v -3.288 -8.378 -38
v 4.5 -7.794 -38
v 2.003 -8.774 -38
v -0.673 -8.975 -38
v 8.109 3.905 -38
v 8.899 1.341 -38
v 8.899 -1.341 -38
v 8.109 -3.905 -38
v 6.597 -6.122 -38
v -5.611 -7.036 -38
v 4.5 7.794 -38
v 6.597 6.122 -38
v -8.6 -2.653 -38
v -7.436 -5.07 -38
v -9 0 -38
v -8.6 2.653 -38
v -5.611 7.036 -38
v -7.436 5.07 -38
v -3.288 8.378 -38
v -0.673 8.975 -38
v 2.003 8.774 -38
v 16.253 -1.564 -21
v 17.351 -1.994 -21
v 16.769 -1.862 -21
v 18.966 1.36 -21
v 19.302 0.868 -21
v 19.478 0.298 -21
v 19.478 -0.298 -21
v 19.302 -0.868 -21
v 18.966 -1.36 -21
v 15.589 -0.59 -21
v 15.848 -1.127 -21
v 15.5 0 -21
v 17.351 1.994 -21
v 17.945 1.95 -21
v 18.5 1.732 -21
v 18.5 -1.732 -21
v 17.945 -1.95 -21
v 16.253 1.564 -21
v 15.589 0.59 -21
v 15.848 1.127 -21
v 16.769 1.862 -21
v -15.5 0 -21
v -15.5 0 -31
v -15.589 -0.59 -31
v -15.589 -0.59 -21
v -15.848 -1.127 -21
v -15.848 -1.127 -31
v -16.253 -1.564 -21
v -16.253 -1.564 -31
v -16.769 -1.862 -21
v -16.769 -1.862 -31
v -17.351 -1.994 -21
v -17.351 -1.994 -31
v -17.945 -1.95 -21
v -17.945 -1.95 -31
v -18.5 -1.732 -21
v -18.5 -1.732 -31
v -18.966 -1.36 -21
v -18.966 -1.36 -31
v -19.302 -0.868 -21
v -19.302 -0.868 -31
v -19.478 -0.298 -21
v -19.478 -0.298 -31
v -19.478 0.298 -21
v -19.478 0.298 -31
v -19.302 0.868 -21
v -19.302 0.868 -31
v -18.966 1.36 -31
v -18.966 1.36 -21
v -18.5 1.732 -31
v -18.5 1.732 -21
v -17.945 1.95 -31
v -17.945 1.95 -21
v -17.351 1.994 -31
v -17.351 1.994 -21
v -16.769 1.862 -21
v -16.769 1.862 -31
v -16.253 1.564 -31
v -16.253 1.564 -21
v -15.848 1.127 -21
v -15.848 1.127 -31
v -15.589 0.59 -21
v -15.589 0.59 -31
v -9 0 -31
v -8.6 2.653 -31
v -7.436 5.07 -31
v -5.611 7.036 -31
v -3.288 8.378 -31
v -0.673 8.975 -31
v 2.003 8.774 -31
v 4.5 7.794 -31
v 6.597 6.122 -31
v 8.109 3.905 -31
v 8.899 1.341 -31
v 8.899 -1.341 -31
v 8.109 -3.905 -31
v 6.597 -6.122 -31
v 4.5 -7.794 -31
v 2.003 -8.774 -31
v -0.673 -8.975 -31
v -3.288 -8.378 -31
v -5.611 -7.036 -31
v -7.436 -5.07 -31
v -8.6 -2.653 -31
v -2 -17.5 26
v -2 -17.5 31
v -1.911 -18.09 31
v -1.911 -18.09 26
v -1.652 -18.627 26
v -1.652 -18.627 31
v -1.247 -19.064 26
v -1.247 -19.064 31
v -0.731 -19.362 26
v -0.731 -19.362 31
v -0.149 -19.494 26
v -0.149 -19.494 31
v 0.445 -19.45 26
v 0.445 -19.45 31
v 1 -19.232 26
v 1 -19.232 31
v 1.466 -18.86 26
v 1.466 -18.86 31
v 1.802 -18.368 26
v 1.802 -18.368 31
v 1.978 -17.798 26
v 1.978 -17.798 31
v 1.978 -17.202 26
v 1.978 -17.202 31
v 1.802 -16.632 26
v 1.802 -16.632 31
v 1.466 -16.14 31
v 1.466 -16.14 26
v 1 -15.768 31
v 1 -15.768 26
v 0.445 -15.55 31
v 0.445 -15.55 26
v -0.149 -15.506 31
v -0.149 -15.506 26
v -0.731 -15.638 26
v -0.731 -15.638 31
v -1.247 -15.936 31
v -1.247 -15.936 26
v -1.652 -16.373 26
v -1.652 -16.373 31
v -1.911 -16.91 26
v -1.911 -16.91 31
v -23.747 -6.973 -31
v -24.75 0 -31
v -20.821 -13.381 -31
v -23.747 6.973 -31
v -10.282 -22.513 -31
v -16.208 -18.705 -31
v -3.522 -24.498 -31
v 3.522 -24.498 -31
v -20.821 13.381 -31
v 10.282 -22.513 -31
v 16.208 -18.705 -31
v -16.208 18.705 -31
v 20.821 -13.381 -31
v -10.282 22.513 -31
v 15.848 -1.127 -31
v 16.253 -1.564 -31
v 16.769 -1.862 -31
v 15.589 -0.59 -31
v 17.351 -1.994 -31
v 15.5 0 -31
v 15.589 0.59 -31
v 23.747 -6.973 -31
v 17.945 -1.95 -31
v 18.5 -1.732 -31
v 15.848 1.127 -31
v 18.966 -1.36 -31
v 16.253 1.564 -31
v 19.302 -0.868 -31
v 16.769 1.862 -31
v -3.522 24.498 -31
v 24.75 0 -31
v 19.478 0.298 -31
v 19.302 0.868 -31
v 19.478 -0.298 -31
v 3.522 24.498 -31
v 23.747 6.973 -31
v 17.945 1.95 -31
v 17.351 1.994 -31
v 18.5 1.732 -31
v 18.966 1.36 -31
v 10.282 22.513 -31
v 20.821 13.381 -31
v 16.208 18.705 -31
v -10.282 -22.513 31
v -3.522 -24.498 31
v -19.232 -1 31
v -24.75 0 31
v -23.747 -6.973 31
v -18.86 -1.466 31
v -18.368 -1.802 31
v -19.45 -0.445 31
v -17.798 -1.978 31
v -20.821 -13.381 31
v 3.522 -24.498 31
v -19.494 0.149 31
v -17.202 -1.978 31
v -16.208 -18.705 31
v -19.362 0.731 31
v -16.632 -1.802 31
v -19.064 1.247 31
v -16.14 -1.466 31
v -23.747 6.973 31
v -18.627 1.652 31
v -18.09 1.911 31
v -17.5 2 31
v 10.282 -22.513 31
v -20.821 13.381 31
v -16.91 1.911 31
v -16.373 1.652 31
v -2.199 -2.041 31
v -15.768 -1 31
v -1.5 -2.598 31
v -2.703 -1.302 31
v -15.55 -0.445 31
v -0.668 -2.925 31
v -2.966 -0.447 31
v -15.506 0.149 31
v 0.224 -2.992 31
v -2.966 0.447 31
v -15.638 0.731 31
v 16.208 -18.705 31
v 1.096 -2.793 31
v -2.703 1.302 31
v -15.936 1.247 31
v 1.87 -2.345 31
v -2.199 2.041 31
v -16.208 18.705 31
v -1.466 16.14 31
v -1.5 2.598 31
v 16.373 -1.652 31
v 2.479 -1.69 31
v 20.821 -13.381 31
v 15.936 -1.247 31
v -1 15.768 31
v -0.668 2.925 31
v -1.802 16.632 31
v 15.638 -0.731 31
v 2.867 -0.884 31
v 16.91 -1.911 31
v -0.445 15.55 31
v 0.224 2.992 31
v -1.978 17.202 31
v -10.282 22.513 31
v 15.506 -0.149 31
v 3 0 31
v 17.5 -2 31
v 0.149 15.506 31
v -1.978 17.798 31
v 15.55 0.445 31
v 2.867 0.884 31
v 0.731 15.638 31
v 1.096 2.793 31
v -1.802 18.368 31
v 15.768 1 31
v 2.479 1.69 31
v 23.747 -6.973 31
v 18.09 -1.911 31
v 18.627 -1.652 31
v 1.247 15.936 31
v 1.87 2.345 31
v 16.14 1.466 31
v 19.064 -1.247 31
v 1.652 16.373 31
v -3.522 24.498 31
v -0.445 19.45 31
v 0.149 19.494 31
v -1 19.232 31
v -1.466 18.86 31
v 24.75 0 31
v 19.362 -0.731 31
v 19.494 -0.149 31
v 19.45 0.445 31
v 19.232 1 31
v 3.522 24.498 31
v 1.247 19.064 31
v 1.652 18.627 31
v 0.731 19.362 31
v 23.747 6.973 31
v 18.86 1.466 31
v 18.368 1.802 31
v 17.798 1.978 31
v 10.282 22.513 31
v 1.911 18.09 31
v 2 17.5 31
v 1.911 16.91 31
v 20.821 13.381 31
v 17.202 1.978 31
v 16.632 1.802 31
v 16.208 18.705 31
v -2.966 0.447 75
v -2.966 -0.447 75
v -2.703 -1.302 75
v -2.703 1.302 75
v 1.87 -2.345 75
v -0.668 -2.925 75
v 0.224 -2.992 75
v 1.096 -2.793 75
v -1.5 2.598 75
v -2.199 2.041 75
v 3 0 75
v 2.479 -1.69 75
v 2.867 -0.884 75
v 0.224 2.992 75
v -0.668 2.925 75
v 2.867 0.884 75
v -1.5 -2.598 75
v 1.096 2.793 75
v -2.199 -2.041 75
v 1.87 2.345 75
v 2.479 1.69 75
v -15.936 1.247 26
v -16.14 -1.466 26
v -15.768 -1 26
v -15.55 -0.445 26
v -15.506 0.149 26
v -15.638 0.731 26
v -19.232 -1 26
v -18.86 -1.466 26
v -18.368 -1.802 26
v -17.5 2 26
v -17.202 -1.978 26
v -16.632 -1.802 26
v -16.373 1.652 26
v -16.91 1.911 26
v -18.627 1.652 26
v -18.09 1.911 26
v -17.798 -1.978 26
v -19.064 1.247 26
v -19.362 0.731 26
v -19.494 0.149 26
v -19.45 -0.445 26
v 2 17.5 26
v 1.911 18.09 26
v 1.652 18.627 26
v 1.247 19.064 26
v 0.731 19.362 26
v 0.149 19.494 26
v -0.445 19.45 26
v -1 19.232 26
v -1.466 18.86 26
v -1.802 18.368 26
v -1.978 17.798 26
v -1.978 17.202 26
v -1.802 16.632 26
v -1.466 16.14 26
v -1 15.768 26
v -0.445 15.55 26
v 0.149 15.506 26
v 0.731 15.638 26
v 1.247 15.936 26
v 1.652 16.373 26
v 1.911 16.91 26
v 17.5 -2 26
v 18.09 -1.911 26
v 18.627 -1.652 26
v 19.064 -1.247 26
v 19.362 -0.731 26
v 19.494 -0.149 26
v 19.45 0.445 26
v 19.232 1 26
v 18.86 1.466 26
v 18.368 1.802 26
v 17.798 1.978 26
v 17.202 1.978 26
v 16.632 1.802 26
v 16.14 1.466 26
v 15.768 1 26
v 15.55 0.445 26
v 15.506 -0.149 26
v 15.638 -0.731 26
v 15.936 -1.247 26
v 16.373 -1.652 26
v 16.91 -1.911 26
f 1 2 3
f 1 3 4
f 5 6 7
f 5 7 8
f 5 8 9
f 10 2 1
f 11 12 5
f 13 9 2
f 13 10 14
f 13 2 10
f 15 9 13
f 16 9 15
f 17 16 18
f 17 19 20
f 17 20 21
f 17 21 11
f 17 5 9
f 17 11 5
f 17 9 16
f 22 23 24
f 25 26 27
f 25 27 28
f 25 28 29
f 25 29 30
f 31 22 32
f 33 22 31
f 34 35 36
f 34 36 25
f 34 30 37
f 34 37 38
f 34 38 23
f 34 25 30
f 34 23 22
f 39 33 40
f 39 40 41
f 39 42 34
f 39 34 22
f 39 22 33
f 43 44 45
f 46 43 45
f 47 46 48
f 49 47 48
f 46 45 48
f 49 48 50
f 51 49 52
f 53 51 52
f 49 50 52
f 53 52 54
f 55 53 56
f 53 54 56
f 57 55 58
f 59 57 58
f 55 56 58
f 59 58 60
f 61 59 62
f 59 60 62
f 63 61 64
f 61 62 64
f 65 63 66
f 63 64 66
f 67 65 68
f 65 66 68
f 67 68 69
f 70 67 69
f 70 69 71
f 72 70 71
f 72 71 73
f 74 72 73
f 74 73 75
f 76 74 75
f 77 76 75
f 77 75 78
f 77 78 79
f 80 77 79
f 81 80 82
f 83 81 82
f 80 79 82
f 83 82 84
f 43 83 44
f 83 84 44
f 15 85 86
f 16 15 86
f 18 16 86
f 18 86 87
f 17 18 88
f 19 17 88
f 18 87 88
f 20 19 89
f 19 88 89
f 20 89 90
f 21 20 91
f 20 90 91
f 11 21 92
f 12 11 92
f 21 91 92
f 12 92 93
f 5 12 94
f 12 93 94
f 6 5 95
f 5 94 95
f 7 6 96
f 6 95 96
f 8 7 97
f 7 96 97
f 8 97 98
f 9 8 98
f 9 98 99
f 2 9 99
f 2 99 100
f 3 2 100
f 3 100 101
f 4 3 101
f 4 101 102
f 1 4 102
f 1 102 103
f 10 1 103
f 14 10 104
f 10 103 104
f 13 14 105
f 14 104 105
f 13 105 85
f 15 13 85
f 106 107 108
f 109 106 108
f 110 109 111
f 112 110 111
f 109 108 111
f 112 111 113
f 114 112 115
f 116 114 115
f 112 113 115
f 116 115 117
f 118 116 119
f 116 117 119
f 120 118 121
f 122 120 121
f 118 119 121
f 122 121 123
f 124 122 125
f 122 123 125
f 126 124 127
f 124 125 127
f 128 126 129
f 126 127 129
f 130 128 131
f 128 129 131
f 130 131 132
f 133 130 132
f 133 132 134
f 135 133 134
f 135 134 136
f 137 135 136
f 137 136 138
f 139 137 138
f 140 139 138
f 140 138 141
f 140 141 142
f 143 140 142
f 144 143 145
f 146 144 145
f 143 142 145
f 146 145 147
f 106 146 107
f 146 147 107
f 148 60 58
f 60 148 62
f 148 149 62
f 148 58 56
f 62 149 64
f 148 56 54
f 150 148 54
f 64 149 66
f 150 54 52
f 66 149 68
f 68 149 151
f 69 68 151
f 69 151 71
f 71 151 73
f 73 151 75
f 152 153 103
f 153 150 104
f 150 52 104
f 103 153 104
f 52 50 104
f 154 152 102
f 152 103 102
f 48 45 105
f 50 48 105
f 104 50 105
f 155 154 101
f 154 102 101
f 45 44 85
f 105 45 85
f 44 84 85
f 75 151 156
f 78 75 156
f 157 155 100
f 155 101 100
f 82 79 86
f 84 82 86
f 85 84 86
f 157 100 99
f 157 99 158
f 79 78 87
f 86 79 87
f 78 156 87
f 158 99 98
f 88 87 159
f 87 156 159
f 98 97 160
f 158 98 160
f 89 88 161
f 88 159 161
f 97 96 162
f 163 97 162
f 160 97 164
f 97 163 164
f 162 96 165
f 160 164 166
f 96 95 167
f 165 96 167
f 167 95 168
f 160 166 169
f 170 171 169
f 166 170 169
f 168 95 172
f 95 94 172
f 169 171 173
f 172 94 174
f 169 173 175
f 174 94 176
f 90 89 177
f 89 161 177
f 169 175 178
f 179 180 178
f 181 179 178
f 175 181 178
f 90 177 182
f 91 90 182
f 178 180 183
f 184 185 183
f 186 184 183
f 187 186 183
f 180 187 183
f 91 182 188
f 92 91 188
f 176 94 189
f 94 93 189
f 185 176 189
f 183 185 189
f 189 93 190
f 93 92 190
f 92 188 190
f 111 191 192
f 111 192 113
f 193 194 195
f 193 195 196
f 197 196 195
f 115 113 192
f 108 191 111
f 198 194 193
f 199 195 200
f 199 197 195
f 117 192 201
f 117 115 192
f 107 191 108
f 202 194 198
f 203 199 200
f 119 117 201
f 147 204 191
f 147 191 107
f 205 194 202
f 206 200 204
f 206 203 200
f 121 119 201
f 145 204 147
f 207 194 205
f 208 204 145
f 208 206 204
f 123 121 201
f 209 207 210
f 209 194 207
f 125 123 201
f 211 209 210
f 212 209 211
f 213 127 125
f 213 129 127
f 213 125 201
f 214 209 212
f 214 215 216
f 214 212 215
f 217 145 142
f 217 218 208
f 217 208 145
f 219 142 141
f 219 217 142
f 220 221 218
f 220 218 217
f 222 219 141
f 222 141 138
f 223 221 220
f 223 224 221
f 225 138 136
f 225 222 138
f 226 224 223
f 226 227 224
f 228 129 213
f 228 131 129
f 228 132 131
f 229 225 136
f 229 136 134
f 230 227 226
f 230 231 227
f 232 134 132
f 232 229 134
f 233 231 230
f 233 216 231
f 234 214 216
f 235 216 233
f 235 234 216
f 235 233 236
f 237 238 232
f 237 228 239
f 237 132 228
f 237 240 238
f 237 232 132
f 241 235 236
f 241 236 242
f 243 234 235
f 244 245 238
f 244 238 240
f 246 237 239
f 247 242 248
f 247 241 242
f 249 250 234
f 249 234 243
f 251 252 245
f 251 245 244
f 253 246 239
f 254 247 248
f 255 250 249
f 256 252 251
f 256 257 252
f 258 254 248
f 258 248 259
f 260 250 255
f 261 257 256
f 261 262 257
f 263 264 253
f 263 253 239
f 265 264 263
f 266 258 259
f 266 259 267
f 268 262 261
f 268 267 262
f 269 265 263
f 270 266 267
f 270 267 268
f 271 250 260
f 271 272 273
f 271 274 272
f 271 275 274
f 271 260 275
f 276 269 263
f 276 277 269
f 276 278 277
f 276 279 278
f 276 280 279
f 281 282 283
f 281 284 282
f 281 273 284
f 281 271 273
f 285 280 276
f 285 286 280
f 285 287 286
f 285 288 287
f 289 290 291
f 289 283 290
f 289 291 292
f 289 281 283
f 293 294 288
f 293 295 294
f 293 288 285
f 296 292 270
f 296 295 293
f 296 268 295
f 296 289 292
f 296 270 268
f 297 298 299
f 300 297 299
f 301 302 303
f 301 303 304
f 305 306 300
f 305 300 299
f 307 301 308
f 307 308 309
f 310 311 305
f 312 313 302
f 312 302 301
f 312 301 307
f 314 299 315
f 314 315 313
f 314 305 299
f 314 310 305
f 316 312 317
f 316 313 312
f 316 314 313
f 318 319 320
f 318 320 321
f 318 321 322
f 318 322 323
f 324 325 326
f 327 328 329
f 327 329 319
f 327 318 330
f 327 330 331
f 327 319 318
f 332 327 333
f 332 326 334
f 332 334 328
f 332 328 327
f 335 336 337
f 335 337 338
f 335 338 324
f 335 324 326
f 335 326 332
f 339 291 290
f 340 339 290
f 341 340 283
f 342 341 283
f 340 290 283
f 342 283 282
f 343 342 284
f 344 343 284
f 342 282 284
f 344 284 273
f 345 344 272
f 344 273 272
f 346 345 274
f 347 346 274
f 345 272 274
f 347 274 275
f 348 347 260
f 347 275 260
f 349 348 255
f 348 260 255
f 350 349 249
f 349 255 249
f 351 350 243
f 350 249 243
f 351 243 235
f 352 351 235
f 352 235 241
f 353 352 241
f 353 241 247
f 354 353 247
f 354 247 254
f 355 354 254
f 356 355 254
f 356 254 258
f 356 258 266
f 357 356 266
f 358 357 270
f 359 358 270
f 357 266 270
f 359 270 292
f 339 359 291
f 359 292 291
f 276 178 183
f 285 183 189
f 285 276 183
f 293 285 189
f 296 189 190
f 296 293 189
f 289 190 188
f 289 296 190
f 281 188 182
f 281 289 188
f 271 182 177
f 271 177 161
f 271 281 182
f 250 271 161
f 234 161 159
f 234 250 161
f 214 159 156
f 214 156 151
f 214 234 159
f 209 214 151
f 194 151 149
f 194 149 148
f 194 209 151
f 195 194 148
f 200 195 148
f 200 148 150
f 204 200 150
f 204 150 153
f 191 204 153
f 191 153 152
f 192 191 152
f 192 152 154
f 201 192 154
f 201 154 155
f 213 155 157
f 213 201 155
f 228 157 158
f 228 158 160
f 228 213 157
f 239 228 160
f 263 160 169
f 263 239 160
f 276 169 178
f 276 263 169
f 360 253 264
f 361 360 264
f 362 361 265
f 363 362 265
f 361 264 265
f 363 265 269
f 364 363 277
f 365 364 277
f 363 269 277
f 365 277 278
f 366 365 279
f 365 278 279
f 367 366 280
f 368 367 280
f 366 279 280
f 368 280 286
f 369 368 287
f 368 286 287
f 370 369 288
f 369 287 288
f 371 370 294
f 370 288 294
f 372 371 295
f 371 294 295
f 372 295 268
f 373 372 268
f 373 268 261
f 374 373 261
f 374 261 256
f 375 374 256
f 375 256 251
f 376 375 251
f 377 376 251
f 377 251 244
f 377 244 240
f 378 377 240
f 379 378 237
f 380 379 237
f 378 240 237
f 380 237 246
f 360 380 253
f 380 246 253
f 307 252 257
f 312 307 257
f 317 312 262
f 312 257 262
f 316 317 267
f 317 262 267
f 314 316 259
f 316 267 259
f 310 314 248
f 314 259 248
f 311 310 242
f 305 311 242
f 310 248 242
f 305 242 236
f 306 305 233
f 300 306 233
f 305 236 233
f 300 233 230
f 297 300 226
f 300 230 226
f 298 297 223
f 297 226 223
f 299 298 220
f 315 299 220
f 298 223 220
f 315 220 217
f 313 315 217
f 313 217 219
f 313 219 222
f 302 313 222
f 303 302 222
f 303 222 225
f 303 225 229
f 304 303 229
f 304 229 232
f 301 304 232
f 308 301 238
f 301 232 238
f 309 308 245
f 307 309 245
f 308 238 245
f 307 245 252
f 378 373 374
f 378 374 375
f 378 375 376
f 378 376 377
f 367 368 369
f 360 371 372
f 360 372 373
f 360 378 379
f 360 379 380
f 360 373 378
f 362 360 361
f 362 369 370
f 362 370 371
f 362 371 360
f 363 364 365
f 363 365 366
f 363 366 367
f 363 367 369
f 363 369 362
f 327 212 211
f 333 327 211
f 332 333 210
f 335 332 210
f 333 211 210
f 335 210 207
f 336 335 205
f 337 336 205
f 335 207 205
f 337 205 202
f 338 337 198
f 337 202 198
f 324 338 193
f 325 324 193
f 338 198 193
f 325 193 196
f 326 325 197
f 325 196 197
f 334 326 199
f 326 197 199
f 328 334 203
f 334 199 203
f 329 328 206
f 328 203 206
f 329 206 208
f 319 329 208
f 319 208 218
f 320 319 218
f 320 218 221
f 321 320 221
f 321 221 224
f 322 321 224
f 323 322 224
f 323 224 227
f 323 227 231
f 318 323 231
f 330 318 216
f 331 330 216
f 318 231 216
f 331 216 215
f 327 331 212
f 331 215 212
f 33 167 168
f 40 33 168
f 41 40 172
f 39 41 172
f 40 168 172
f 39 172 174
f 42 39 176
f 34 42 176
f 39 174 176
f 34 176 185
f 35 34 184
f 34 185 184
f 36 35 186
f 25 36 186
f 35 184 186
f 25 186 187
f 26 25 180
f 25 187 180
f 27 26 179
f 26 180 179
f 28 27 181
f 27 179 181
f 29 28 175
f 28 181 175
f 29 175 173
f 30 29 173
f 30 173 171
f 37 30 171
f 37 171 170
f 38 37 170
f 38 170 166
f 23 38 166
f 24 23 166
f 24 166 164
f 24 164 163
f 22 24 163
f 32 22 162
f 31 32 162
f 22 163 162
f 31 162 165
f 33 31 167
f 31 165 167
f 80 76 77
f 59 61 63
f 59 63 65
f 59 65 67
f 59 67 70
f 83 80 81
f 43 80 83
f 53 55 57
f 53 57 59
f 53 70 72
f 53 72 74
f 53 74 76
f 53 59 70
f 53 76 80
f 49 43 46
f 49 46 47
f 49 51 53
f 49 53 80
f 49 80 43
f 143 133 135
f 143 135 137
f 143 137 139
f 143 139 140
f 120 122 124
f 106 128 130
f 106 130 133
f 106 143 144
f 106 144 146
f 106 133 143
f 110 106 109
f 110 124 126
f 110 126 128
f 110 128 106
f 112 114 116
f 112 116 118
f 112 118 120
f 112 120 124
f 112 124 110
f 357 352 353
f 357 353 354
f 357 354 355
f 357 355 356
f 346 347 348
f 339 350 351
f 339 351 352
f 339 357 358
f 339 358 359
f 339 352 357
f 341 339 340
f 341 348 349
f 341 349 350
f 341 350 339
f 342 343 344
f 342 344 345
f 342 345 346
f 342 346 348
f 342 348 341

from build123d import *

# Parameters (mm, degrees)
SKETCH1_R           = 24.75
BOSS_EXTRUDE1_DEPTH = 31
SKETCH2_R           = 3
BOSS_EXTRUDE2_DEPTH = 44
SKETCH6_R           = 2
CUT_EXTRUDE3_DEPTH  = 5
CIRPATTERN1_COUNT   = 4
SKETCH5_R           = 2
CUT_EXTRUDE2_DEPTH  = 10
CIRPATTERN2_COUNT   = 2
SKETCH7_R           = 9
BOSS_EXTRUDE3_DEPTH = 7


with BuildPart() as part:
    # Sketch1 → Boss-Extrude1 (new body, symmetric)
    with BuildSketch(Plane.XY):
        Circle(SKETCH1_R)
    extrude(amount=BOSS_EXTRUDE1_DEPTH, both=True)

    # Sketch2 → Boss-Extrude2 (add)
    with BuildSketch(Plane.XY.offset(31)):
        Circle(SKETCH2_R)
    extrude(amount=BOSS_EXTRUDE2_DEPTH)

    # Sketch6 → Cut-Extrude3 (cut)
    with BuildSketch(Plane.XY.offset(31)):
        with Locations((0, 17.5)):
            Circle(SKETCH6_R)
    cut_extrude3 = extrude(amount=-CUT_EXTRUDE3_DEPTH, mode=Mode.SUBTRACT)

    # CirPattern1: Cut-Extrude3 ×4 about axis
    cirpattern1_axis = Axis((0, 0, 0), (0, 0, 1))
    for i in range(1, CIRPATTERN1_COUNT):
        add(cut_extrude3.rotate(cirpattern1_axis, i * 360 / CIRPATTERN1_COUNT), mode=Mode.SUBTRACT)

    # Sketch5 → Cut-Extrude2 (cut)
    with BuildSketch(Plane(origin=(0, 0, -31), x_dir=(-1, 0, 0), z_dir=(0, 0, -1))):
        with Locations((-17.5, 0)):
            Circle(SKETCH5_R)
    cut_extrude2 = extrude(amount=-CUT_EXTRUDE2_DEPTH, mode=Mode.SUBTRACT)

    # CirPattern2: Cut-Extrude2 ×2 about axis
    cirpattern2_axis = Axis((0, 0, 0), (0, 0, 1))
    for i in range(1, CIRPATTERN2_COUNT):
        add(cut_extrude2.rotate(cirpattern2_axis, i * 360 / CIRPATTERN2_COUNT), mode=Mode.SUBTRACT)

    # Sketch7 → Boss-Extrude3 (add)
    with BuildSketch(Plane(origin=(0, 0, -31), x_dir=(-1, 0, 0), z_dir=(0, 0, -1))):
        Circle(SKETCH7_R)
    extrude(amount=BOSS_EXTRUDE3_DEPTH)


solid = part.part
